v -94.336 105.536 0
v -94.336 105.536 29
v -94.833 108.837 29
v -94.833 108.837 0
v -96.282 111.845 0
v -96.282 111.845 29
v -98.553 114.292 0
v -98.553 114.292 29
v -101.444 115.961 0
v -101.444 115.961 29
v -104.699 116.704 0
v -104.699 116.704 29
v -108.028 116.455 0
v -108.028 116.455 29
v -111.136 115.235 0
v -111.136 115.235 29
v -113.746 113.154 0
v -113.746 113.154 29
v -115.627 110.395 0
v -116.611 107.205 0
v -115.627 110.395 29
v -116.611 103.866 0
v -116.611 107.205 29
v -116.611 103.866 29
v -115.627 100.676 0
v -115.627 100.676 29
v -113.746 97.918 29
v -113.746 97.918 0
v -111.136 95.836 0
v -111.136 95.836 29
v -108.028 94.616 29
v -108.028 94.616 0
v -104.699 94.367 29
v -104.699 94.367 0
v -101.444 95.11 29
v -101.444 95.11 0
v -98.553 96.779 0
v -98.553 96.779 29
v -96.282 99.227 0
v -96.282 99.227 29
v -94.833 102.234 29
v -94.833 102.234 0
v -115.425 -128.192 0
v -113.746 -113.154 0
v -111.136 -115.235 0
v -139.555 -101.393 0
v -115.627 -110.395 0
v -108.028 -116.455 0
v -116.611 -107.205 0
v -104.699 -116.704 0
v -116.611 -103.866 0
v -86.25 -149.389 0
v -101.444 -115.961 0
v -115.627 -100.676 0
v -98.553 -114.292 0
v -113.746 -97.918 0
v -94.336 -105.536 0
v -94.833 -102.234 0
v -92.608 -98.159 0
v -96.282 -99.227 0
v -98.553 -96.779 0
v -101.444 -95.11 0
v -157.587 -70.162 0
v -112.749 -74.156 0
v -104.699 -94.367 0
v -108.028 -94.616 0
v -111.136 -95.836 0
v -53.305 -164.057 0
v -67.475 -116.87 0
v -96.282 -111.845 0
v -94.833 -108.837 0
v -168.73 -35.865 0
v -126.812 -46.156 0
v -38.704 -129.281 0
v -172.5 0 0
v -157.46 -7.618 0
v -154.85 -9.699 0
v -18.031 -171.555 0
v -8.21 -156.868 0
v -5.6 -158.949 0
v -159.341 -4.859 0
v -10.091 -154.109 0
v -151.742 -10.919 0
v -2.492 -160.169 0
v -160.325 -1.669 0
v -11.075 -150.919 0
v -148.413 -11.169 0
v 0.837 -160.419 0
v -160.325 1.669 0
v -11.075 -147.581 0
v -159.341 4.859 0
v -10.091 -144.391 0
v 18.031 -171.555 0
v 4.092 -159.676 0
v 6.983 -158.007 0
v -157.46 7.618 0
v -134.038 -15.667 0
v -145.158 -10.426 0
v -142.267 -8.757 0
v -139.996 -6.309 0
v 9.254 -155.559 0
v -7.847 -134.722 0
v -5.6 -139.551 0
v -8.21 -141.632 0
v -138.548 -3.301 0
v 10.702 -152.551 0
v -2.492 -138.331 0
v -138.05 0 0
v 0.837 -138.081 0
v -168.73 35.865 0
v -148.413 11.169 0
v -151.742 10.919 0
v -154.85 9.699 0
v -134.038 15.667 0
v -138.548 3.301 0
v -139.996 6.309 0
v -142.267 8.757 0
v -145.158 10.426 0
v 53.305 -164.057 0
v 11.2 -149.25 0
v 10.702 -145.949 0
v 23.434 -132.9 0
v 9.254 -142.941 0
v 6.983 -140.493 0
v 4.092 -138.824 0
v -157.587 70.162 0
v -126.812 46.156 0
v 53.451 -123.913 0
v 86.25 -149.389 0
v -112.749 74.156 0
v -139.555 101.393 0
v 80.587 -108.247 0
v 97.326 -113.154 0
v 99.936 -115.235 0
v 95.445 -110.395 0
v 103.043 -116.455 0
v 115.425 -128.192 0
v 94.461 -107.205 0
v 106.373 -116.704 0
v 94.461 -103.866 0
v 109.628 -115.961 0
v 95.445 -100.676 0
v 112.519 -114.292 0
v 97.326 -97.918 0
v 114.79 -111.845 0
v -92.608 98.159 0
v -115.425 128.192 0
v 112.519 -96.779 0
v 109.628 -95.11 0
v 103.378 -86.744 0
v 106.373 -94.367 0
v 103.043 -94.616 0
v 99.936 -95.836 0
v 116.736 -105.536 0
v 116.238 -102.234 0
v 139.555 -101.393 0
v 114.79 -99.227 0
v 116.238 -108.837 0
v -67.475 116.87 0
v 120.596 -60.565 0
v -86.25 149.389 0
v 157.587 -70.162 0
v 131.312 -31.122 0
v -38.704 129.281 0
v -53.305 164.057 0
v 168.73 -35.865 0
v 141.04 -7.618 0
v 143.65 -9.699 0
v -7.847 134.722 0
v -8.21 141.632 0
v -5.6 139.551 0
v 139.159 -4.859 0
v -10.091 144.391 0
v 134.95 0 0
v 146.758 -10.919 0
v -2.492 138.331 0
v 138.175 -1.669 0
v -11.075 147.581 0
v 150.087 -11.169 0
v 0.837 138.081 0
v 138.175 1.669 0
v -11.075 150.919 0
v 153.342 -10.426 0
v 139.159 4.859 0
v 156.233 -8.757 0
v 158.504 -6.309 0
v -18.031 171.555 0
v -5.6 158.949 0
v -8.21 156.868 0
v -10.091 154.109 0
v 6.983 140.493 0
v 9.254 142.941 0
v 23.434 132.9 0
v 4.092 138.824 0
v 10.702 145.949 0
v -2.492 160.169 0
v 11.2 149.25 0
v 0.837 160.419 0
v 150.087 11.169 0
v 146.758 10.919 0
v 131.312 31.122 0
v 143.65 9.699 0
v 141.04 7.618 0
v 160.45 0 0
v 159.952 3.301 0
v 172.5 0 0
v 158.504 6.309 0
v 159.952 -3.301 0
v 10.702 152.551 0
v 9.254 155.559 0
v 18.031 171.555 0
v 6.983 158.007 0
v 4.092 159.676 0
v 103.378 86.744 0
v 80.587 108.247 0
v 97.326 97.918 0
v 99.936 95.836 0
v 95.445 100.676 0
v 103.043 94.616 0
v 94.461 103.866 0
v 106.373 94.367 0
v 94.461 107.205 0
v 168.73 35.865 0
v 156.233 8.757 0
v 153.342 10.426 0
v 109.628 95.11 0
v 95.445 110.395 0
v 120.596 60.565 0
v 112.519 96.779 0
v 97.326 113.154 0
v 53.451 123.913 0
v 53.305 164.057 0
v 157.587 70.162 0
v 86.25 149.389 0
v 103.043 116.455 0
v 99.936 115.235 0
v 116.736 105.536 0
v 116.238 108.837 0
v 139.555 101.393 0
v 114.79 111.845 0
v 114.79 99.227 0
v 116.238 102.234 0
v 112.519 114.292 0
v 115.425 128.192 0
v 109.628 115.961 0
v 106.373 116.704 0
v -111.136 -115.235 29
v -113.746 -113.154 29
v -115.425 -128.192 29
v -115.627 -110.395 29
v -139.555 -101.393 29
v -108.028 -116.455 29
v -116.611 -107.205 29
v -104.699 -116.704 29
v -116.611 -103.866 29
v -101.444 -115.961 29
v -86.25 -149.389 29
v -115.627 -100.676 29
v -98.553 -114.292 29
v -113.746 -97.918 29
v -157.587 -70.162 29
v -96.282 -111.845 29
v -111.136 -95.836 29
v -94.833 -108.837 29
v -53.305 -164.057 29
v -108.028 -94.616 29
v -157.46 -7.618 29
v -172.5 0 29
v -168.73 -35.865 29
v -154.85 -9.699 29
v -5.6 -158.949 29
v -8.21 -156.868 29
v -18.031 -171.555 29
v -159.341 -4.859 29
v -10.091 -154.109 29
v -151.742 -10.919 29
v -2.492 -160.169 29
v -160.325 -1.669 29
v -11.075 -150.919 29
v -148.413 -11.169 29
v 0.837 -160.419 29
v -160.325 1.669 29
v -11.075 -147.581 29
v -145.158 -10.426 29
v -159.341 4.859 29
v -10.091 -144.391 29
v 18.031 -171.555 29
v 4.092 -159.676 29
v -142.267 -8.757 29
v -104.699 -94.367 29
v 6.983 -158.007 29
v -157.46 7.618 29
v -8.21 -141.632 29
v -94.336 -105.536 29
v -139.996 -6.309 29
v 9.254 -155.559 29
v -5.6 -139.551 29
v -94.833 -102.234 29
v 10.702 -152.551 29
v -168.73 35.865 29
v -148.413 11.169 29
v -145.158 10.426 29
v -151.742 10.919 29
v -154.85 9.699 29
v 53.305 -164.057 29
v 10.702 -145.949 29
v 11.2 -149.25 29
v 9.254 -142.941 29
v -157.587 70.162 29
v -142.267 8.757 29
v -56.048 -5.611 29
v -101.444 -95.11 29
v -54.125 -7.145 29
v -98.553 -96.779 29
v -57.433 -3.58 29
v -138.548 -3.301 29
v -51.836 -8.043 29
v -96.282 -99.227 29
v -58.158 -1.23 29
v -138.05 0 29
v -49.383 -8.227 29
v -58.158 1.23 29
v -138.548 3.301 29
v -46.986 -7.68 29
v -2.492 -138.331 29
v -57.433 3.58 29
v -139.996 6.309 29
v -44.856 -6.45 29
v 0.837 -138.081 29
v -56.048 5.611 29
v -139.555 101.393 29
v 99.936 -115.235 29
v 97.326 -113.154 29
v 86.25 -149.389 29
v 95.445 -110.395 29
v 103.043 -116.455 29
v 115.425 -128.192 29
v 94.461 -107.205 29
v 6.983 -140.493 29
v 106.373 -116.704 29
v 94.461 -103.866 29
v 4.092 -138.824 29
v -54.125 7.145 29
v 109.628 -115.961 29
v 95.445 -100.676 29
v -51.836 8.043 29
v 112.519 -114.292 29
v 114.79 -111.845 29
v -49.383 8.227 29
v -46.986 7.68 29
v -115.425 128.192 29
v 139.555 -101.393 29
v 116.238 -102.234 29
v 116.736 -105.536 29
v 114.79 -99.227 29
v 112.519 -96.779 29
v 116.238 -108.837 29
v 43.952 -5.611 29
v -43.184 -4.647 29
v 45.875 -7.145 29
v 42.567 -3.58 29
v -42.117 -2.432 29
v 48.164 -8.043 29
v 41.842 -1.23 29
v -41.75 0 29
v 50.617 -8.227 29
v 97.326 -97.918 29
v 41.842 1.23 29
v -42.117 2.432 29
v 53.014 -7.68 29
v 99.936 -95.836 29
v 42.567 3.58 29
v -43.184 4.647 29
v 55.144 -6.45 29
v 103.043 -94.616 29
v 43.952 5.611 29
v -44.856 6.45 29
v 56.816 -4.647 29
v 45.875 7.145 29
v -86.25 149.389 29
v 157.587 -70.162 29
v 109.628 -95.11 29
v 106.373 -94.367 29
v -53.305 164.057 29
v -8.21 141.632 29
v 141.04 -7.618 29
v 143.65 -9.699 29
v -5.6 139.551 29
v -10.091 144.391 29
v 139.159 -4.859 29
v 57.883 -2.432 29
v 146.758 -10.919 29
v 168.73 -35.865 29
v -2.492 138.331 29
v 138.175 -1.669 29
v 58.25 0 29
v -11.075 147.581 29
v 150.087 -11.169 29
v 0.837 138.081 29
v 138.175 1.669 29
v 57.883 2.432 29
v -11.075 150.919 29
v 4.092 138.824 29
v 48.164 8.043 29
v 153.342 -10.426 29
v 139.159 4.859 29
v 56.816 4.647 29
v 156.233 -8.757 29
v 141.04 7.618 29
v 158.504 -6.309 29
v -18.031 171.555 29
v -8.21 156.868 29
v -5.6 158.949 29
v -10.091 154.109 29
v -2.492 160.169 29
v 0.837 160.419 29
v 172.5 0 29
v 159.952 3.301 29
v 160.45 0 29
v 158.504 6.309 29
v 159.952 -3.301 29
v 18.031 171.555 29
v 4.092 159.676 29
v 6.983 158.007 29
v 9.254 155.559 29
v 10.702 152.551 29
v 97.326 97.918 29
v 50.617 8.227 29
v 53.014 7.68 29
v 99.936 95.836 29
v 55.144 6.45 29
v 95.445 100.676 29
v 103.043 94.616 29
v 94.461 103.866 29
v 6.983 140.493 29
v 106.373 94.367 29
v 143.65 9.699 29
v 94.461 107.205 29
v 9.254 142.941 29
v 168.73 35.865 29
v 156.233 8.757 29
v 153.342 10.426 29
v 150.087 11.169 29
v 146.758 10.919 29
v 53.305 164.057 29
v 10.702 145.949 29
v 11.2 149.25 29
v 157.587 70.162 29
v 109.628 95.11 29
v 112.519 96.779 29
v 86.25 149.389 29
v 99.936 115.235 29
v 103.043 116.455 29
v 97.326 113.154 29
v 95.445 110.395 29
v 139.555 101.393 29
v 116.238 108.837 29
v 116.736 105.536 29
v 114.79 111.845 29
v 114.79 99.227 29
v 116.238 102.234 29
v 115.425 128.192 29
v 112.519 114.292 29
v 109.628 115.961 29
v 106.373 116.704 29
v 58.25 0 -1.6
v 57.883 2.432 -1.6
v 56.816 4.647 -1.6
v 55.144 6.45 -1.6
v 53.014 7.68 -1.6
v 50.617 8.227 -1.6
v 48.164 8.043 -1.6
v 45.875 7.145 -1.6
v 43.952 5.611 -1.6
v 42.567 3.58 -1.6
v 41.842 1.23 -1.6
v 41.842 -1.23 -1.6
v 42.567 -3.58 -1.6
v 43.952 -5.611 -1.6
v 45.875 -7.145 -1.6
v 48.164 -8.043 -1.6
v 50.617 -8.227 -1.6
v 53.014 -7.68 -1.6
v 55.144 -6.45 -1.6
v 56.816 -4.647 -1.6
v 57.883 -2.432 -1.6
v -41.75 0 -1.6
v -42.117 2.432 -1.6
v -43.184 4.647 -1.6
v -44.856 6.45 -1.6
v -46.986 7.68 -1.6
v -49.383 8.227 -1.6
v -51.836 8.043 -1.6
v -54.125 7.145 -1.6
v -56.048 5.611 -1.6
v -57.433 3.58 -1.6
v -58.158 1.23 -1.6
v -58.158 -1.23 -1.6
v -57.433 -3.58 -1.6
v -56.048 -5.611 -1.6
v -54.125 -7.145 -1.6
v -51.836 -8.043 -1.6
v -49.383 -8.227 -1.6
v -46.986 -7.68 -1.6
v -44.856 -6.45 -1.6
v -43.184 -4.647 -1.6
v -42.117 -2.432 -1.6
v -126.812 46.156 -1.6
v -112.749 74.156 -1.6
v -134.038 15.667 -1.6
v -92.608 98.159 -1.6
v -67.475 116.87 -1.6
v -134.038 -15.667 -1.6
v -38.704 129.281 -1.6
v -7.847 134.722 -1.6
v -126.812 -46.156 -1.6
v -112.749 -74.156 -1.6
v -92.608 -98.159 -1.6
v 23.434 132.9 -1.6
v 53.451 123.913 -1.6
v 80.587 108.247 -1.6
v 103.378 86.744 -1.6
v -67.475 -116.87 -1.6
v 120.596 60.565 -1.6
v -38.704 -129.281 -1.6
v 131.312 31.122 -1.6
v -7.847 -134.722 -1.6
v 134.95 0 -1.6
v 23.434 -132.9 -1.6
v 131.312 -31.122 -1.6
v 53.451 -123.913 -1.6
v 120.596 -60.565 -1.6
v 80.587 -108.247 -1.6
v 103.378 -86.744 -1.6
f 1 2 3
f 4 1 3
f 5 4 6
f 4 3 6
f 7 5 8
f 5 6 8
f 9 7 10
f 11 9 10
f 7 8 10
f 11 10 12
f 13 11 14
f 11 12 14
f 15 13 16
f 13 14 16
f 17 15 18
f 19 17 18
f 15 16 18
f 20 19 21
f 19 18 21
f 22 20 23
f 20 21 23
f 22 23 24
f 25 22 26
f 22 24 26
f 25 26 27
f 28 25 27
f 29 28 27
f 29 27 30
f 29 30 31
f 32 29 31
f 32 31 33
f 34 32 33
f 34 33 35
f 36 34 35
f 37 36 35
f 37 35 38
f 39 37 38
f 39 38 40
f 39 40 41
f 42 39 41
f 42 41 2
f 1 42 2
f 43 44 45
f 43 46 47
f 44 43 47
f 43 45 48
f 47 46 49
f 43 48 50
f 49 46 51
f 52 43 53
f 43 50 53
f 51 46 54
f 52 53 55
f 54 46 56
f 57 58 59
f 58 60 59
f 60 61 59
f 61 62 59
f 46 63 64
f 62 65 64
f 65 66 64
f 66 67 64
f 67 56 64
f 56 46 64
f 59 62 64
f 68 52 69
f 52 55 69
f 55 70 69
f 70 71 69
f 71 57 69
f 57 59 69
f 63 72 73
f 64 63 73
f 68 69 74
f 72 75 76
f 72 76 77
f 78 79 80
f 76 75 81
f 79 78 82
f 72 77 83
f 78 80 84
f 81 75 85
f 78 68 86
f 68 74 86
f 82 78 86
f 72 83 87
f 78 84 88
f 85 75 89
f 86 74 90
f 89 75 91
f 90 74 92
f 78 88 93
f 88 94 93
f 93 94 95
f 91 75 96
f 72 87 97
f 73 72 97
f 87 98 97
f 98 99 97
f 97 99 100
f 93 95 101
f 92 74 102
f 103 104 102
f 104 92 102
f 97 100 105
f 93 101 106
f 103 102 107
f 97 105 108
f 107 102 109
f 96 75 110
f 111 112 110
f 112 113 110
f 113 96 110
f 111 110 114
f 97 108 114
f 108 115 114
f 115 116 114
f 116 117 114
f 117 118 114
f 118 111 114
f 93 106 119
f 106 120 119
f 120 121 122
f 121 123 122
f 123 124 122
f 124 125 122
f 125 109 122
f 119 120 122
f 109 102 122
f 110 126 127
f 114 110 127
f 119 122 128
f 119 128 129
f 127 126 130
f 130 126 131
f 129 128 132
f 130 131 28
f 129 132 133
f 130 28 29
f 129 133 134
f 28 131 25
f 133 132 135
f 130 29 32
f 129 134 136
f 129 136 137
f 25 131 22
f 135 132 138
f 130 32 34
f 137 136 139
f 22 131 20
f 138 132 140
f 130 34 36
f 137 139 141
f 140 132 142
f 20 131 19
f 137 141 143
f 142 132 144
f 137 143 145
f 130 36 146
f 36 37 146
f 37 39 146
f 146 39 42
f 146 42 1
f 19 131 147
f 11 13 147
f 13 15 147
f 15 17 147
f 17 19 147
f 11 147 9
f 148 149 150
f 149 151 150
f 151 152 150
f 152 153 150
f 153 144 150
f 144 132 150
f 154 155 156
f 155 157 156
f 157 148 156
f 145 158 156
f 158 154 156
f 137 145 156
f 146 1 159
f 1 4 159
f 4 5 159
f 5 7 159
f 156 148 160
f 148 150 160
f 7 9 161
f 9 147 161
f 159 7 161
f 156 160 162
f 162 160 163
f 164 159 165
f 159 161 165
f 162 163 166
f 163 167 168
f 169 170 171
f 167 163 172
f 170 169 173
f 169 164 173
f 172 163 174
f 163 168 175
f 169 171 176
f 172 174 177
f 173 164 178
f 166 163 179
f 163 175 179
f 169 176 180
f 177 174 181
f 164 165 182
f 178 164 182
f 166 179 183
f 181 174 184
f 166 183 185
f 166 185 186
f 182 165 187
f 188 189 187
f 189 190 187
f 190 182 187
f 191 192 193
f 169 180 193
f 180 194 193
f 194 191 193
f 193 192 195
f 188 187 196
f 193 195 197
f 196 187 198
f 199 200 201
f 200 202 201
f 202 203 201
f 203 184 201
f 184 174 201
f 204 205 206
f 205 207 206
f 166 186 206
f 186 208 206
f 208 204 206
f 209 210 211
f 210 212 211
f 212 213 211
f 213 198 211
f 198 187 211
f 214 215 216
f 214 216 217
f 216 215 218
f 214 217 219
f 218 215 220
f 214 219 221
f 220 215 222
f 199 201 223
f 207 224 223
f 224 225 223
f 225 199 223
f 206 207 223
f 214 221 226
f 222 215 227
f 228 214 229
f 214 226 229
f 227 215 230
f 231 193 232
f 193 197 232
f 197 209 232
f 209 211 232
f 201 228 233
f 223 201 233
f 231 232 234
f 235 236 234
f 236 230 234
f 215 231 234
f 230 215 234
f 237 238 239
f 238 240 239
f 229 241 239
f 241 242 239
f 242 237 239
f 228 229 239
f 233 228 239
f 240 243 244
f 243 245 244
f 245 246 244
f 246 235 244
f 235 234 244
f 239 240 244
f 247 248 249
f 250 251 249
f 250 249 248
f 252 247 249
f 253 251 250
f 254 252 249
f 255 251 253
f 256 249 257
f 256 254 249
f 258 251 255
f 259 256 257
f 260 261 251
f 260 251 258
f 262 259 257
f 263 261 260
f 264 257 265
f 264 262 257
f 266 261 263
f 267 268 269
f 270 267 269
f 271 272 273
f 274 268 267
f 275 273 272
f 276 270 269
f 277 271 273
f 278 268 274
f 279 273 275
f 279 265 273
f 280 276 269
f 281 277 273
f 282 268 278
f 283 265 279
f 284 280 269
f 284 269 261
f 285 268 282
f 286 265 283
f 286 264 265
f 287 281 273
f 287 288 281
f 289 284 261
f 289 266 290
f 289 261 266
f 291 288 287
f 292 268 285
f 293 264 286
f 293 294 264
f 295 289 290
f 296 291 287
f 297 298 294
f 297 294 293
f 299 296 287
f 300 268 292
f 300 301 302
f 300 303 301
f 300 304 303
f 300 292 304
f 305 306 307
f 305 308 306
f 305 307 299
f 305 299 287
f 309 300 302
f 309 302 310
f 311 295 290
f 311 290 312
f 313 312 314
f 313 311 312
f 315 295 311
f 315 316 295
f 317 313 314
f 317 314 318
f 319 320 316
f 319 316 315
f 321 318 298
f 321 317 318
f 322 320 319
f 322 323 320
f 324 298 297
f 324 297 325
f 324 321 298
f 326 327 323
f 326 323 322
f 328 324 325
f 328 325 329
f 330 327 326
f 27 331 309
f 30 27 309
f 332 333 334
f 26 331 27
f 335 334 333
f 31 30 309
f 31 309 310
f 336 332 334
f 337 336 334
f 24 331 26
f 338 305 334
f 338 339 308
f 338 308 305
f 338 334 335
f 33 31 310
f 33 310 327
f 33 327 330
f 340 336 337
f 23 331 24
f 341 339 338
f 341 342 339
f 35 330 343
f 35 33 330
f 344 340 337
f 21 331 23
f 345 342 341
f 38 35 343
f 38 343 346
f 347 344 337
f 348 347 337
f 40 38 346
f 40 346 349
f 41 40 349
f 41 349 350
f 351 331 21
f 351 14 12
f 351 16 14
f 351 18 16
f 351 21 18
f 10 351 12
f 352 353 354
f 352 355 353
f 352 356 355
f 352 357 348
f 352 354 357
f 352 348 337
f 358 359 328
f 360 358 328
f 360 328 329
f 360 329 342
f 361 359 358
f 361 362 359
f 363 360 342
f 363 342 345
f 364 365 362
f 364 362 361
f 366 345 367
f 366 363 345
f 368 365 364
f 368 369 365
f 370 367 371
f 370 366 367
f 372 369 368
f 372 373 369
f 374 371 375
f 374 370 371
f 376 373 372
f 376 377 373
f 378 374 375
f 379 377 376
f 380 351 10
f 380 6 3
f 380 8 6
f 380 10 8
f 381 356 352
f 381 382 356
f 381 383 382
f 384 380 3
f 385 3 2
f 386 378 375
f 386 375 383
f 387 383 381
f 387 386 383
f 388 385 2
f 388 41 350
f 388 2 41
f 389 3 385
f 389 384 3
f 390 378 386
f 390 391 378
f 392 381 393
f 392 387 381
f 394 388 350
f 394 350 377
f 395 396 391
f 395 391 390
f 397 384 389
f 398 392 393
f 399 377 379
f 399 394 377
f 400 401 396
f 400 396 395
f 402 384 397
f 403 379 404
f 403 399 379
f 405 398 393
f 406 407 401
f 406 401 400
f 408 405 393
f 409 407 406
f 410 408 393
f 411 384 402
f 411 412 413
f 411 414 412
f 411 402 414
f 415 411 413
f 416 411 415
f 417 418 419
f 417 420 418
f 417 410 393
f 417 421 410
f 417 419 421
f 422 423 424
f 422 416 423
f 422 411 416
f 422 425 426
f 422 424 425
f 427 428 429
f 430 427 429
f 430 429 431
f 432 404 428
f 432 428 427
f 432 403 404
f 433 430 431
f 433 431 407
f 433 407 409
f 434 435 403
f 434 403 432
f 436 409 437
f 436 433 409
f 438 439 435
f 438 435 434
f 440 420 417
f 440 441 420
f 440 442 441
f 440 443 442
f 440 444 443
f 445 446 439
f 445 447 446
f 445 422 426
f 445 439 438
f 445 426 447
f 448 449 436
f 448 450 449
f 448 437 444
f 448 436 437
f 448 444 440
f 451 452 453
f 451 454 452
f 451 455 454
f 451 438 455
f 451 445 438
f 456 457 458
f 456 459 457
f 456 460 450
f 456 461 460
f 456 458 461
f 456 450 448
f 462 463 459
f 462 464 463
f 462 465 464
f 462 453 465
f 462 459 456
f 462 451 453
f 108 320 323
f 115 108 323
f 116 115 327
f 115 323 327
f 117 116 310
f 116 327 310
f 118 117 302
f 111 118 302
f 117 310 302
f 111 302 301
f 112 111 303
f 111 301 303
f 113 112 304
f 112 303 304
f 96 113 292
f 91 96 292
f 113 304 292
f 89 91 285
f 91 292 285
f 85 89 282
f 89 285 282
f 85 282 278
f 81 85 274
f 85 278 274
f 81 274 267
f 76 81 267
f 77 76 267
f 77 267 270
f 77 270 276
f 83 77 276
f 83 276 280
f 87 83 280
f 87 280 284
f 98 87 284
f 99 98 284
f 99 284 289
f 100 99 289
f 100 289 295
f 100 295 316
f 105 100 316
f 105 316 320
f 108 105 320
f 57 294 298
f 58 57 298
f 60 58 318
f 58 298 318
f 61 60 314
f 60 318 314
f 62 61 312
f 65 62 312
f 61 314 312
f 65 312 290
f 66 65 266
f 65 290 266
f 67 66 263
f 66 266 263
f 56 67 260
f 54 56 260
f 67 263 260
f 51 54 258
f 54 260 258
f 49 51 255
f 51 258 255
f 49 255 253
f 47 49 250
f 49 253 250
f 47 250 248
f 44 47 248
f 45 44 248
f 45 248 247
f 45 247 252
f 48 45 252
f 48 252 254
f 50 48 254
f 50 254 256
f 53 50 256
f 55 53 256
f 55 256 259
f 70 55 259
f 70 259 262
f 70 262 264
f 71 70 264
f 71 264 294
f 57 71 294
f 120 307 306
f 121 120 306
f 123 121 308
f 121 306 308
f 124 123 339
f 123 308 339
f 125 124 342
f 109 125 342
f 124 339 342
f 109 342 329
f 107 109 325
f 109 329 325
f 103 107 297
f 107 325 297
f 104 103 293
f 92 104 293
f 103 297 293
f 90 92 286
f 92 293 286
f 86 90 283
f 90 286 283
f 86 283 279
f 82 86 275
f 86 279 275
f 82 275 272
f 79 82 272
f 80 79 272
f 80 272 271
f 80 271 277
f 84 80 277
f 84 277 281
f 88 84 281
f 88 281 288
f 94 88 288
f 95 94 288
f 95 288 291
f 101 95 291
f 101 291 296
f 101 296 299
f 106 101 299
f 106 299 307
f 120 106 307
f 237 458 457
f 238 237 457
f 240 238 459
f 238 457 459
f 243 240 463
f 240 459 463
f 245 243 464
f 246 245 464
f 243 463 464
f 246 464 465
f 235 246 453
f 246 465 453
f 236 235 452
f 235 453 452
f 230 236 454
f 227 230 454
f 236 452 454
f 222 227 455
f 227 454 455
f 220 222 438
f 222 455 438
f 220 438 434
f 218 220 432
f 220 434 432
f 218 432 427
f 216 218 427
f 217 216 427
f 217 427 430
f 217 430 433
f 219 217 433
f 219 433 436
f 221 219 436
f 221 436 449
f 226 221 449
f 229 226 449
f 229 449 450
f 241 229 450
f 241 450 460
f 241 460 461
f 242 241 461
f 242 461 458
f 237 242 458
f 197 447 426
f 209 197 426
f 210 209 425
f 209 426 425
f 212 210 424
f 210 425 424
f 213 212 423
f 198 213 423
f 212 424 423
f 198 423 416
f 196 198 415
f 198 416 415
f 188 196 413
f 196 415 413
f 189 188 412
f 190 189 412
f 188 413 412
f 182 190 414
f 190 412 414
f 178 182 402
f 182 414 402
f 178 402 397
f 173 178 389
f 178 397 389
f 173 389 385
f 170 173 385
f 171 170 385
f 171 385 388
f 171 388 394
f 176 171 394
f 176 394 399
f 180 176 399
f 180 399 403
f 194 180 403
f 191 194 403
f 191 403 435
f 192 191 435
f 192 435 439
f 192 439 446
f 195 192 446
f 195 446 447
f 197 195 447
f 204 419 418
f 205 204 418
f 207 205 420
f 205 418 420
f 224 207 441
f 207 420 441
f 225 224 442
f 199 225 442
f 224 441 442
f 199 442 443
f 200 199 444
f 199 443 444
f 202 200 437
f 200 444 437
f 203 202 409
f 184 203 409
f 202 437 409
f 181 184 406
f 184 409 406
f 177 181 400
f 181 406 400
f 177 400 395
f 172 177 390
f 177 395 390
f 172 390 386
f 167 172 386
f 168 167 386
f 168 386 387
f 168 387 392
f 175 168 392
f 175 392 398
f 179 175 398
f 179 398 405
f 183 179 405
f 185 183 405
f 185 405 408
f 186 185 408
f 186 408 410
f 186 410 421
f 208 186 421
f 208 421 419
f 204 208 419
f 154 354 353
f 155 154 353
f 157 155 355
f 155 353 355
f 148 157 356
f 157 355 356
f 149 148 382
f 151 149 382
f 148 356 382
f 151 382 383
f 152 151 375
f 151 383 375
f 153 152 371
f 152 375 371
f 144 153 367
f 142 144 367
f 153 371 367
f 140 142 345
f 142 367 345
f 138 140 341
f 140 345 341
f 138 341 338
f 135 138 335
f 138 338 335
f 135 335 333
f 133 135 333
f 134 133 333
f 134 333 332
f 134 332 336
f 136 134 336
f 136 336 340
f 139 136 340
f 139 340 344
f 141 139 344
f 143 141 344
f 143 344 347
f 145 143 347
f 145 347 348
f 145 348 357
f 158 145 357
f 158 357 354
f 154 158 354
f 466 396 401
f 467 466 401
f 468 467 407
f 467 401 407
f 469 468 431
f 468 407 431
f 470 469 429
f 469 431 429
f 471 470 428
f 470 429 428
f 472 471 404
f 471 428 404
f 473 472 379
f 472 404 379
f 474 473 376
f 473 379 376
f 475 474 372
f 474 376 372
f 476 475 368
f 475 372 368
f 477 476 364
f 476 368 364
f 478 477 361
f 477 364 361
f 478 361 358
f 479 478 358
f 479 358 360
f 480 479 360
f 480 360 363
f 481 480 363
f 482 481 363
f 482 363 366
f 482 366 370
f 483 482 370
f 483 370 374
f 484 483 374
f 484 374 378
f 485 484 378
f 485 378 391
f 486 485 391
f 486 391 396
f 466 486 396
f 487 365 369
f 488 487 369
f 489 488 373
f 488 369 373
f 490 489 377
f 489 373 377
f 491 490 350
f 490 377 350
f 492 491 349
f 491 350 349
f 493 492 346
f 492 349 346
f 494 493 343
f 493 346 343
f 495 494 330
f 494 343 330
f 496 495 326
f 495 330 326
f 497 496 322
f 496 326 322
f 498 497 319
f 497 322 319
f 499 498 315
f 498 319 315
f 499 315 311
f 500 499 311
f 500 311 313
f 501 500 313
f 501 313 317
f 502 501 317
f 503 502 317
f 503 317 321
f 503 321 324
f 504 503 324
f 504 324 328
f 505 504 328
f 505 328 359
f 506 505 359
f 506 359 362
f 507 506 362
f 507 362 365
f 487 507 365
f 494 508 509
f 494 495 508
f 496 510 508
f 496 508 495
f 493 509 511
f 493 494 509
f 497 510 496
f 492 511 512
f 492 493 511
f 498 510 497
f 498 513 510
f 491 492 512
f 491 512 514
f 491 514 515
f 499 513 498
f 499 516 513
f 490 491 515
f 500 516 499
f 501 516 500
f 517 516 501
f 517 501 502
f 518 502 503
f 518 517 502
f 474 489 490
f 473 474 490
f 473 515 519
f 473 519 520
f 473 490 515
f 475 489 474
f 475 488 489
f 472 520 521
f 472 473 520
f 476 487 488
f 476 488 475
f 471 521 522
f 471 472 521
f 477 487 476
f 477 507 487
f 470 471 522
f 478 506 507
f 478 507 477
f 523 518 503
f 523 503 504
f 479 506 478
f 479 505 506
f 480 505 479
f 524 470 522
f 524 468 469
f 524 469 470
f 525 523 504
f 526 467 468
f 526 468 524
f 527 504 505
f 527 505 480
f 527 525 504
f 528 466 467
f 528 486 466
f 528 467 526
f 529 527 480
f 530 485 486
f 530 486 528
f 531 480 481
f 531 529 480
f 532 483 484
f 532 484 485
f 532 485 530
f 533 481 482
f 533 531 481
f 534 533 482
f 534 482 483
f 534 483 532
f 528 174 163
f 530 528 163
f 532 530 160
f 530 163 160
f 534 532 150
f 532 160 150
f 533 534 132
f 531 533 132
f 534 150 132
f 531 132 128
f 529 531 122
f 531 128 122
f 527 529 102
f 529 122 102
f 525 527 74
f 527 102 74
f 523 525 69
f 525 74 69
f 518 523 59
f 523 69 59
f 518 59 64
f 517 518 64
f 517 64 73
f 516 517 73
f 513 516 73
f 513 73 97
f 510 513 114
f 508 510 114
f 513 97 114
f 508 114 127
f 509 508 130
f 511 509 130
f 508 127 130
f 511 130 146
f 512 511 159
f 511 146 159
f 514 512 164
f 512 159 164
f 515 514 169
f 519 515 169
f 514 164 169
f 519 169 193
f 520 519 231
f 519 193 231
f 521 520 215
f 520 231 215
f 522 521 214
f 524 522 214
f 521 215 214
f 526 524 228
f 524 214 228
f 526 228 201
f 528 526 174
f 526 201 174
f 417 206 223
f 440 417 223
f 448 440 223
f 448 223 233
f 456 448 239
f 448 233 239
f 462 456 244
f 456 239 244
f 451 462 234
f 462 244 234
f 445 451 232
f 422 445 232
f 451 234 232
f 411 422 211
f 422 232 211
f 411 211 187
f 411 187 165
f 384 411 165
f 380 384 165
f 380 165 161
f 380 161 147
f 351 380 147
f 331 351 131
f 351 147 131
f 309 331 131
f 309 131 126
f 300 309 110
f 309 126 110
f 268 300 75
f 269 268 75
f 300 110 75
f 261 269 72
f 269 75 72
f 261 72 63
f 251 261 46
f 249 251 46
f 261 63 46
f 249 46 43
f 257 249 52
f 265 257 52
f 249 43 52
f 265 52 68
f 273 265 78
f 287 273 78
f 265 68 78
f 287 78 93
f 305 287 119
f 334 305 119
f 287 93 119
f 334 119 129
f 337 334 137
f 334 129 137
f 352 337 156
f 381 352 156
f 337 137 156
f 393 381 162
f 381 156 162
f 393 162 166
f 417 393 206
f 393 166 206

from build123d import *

# Parameters (mm, degrees)
F0_R     = 172.5
F1_DEPTH = 29
F2_R     = 134.95
F3_DEPTH = 1.6
F4_R     = 11.2
F5_DEPTH = 30.601
F6_R     = 8.25
F7_DEPTH = 30.601


with BuildPart() as f1:
    # F0 (on Top) → F1 (new body)
    with BuildSketch(Plane.XY):
        Circle(F0_R)
    extrude(amount=F1_DEPTH)

    # F2 (on face) → F3 (join)
    with BuildSketch(Plane(origin=(0, 0, 0), x_dir=(1, 0, 0), z_dir=(0, 0, -1))):
        Circle(F2_R)
    extrude(amount=F3_DEPTH)

    # F4 (on face) → F5 (cut, through all)
    with BuildSketch(Plane.XY.offset(29)):
        with Locations((0, 149.25)):
            Circle(F4_R)
        with Locations((-105.535687, 105.535687)):
            Circle(F4_R)
        with Locations((-149.25, 0)):
            Circle(F4_R)
        with Locations((-105.535687, -105.535687)):
            Circle(F4_R)
        with Locations((0, -149.25)):
            Circle(F4_R)
        with Locations((105.535687, -105.535687)):
            Circle(F4_R)
        with Locations((149.25, 0)):
            Circle(F4_R)
        with Locations((105.535687, 105.535687)):
            Circle(F4_R)
    extrude(amount=-F5_DEPTH, mode=Mode.SUBTRACT)

    # F6 (on face) → F7 (cut, through all)
    with BuildSketch(Plane.XY.offset(29)):
        with Locations((-50, 0)):
            Circle(F6_R)
        with Locations((50, 0)):
            Circle(F6_R)
    extrude(amount=-F7_DEPTH, mode=Mode.SUBTRACT)


solid = f1.part
